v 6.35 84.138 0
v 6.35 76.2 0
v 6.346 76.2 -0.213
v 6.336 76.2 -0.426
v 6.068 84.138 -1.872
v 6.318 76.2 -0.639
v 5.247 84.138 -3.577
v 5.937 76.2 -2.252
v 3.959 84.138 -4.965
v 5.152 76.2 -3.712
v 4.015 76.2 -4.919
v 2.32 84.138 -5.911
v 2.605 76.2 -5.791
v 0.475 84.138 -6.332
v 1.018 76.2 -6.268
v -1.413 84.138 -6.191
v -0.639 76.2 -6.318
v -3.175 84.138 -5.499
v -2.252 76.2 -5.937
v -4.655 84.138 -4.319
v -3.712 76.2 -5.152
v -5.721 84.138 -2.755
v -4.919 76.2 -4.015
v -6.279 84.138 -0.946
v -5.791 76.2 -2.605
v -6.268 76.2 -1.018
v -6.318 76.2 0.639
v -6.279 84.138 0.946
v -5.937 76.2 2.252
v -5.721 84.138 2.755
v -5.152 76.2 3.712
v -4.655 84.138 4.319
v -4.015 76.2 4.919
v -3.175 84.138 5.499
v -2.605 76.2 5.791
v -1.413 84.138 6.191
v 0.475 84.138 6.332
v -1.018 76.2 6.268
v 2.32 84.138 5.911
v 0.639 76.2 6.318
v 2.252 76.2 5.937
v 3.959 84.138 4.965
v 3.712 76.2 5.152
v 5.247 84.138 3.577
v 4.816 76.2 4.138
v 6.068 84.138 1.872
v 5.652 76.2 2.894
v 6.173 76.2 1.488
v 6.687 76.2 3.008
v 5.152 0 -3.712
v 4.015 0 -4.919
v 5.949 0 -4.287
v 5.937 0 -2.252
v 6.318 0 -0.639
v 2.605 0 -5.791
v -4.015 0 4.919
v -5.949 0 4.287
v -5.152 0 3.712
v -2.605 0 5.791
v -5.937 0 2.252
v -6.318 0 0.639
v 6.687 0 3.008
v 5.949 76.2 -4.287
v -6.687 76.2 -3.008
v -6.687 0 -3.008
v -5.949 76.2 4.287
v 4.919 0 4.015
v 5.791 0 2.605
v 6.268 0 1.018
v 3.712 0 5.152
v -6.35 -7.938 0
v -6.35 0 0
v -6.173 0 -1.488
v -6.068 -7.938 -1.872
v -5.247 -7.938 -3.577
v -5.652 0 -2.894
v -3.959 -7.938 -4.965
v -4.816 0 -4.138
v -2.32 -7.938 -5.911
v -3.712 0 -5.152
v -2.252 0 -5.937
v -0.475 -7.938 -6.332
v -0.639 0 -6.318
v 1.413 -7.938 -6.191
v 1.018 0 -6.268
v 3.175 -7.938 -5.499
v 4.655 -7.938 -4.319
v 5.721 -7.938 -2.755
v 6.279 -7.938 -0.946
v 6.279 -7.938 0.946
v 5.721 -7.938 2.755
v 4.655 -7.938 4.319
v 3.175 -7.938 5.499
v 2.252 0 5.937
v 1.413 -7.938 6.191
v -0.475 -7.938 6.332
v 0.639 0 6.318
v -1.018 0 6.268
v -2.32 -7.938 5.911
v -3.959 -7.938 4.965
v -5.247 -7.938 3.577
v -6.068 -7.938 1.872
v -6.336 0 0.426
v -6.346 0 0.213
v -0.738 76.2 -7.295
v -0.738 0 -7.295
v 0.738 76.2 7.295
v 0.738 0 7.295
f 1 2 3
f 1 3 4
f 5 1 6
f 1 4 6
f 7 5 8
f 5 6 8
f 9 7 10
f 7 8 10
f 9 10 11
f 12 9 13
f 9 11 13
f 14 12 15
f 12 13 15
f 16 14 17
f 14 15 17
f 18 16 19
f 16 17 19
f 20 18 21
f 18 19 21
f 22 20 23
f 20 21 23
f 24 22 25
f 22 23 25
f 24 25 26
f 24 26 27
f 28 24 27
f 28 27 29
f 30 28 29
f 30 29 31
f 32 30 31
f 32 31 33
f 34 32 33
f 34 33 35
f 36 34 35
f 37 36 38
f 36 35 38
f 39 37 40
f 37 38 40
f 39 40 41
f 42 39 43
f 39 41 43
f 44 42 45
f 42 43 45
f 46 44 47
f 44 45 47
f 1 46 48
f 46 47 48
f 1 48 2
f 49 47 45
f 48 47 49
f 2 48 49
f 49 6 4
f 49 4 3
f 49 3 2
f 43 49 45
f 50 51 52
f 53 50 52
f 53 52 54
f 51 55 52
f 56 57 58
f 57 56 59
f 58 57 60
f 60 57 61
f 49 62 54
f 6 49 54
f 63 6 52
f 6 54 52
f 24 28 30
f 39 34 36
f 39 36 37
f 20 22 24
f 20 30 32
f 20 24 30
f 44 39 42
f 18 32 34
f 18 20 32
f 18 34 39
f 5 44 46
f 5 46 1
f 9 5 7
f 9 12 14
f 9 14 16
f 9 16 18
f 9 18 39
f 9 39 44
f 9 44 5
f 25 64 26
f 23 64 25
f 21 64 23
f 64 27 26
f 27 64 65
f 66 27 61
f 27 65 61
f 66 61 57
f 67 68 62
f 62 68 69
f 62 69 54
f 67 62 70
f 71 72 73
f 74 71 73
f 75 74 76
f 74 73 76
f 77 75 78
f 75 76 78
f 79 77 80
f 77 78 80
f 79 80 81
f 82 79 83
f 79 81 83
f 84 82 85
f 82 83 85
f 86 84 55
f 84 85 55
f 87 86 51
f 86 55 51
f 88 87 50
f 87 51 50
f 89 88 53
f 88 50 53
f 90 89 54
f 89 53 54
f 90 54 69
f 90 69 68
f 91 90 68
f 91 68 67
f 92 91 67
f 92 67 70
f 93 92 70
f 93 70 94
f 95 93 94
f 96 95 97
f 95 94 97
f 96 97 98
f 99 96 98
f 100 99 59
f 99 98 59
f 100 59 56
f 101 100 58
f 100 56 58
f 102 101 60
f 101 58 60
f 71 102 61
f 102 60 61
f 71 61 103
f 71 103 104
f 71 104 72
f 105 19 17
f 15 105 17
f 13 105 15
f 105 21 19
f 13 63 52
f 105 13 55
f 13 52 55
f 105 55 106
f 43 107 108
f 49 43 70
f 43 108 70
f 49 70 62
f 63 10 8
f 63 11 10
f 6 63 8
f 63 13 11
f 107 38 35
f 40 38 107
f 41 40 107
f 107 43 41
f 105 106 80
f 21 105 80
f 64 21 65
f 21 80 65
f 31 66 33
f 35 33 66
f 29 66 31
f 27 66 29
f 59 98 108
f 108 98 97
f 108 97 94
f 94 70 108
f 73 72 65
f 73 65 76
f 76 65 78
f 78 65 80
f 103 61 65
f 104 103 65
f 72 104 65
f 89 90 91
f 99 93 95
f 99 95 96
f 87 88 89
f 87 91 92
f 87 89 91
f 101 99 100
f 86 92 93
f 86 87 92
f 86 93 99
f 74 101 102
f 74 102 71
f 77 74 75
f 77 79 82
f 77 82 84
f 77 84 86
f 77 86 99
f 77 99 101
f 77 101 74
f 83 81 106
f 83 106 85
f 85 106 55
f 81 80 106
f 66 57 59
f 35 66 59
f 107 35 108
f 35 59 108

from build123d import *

# Parameters (mm, degrees)
BOSS_EXTRUDE1_DEPTH = 76.2
SKETCH3_R           = 6.35
BOSS_EXTRUDE2_DEPTH = 7.9375
SKETCH4_R           = 6.35
BOSS_EXTRUDE3_DEPTH = 7.9375


with BuildPart() as part:
    # Sketch1 → Boss-Extrude1 (new body)
    with BuildSketch(Plane(origin=(0, 0, 0), x_dir=(1, 0, 0), z_dir=(0, 1, 0))):
        Polygon((5.948792794, 4.286630102), (-0.737934168, 7.295120732), (-6.686726962, 3.008490631), (-5.948792794, -4.286630102), (0.737934168, -7.295120732), (6.686726962, -3.008490631), align=None)
    extrude(amount=BOSS_EXTRUDE1_DEPTH)

    # Sketch3 → Boss-Extrude2 (add)
    with BuildSketch(Plane(origin=(0, 0, 0), x_dir=(-1, 0, 0), z_dir=(0, -1, 0))):
        Circle(SKETCH3_R)
    extrude(amount=BOSS_EXTRUDE2_DEPTH)

    # Sketch4 → Boss-Extrude3 (add)
    with BuildSketch(Plane(origin=(0, 76.2, 0), x_dir=(1, 0, 0), z_dir=(0, 1, 0))):
        Circle(SKETCH4_R)
    extrude(amount=BOSS_EXTRUDE3_DEPTH)


solid = part.part
